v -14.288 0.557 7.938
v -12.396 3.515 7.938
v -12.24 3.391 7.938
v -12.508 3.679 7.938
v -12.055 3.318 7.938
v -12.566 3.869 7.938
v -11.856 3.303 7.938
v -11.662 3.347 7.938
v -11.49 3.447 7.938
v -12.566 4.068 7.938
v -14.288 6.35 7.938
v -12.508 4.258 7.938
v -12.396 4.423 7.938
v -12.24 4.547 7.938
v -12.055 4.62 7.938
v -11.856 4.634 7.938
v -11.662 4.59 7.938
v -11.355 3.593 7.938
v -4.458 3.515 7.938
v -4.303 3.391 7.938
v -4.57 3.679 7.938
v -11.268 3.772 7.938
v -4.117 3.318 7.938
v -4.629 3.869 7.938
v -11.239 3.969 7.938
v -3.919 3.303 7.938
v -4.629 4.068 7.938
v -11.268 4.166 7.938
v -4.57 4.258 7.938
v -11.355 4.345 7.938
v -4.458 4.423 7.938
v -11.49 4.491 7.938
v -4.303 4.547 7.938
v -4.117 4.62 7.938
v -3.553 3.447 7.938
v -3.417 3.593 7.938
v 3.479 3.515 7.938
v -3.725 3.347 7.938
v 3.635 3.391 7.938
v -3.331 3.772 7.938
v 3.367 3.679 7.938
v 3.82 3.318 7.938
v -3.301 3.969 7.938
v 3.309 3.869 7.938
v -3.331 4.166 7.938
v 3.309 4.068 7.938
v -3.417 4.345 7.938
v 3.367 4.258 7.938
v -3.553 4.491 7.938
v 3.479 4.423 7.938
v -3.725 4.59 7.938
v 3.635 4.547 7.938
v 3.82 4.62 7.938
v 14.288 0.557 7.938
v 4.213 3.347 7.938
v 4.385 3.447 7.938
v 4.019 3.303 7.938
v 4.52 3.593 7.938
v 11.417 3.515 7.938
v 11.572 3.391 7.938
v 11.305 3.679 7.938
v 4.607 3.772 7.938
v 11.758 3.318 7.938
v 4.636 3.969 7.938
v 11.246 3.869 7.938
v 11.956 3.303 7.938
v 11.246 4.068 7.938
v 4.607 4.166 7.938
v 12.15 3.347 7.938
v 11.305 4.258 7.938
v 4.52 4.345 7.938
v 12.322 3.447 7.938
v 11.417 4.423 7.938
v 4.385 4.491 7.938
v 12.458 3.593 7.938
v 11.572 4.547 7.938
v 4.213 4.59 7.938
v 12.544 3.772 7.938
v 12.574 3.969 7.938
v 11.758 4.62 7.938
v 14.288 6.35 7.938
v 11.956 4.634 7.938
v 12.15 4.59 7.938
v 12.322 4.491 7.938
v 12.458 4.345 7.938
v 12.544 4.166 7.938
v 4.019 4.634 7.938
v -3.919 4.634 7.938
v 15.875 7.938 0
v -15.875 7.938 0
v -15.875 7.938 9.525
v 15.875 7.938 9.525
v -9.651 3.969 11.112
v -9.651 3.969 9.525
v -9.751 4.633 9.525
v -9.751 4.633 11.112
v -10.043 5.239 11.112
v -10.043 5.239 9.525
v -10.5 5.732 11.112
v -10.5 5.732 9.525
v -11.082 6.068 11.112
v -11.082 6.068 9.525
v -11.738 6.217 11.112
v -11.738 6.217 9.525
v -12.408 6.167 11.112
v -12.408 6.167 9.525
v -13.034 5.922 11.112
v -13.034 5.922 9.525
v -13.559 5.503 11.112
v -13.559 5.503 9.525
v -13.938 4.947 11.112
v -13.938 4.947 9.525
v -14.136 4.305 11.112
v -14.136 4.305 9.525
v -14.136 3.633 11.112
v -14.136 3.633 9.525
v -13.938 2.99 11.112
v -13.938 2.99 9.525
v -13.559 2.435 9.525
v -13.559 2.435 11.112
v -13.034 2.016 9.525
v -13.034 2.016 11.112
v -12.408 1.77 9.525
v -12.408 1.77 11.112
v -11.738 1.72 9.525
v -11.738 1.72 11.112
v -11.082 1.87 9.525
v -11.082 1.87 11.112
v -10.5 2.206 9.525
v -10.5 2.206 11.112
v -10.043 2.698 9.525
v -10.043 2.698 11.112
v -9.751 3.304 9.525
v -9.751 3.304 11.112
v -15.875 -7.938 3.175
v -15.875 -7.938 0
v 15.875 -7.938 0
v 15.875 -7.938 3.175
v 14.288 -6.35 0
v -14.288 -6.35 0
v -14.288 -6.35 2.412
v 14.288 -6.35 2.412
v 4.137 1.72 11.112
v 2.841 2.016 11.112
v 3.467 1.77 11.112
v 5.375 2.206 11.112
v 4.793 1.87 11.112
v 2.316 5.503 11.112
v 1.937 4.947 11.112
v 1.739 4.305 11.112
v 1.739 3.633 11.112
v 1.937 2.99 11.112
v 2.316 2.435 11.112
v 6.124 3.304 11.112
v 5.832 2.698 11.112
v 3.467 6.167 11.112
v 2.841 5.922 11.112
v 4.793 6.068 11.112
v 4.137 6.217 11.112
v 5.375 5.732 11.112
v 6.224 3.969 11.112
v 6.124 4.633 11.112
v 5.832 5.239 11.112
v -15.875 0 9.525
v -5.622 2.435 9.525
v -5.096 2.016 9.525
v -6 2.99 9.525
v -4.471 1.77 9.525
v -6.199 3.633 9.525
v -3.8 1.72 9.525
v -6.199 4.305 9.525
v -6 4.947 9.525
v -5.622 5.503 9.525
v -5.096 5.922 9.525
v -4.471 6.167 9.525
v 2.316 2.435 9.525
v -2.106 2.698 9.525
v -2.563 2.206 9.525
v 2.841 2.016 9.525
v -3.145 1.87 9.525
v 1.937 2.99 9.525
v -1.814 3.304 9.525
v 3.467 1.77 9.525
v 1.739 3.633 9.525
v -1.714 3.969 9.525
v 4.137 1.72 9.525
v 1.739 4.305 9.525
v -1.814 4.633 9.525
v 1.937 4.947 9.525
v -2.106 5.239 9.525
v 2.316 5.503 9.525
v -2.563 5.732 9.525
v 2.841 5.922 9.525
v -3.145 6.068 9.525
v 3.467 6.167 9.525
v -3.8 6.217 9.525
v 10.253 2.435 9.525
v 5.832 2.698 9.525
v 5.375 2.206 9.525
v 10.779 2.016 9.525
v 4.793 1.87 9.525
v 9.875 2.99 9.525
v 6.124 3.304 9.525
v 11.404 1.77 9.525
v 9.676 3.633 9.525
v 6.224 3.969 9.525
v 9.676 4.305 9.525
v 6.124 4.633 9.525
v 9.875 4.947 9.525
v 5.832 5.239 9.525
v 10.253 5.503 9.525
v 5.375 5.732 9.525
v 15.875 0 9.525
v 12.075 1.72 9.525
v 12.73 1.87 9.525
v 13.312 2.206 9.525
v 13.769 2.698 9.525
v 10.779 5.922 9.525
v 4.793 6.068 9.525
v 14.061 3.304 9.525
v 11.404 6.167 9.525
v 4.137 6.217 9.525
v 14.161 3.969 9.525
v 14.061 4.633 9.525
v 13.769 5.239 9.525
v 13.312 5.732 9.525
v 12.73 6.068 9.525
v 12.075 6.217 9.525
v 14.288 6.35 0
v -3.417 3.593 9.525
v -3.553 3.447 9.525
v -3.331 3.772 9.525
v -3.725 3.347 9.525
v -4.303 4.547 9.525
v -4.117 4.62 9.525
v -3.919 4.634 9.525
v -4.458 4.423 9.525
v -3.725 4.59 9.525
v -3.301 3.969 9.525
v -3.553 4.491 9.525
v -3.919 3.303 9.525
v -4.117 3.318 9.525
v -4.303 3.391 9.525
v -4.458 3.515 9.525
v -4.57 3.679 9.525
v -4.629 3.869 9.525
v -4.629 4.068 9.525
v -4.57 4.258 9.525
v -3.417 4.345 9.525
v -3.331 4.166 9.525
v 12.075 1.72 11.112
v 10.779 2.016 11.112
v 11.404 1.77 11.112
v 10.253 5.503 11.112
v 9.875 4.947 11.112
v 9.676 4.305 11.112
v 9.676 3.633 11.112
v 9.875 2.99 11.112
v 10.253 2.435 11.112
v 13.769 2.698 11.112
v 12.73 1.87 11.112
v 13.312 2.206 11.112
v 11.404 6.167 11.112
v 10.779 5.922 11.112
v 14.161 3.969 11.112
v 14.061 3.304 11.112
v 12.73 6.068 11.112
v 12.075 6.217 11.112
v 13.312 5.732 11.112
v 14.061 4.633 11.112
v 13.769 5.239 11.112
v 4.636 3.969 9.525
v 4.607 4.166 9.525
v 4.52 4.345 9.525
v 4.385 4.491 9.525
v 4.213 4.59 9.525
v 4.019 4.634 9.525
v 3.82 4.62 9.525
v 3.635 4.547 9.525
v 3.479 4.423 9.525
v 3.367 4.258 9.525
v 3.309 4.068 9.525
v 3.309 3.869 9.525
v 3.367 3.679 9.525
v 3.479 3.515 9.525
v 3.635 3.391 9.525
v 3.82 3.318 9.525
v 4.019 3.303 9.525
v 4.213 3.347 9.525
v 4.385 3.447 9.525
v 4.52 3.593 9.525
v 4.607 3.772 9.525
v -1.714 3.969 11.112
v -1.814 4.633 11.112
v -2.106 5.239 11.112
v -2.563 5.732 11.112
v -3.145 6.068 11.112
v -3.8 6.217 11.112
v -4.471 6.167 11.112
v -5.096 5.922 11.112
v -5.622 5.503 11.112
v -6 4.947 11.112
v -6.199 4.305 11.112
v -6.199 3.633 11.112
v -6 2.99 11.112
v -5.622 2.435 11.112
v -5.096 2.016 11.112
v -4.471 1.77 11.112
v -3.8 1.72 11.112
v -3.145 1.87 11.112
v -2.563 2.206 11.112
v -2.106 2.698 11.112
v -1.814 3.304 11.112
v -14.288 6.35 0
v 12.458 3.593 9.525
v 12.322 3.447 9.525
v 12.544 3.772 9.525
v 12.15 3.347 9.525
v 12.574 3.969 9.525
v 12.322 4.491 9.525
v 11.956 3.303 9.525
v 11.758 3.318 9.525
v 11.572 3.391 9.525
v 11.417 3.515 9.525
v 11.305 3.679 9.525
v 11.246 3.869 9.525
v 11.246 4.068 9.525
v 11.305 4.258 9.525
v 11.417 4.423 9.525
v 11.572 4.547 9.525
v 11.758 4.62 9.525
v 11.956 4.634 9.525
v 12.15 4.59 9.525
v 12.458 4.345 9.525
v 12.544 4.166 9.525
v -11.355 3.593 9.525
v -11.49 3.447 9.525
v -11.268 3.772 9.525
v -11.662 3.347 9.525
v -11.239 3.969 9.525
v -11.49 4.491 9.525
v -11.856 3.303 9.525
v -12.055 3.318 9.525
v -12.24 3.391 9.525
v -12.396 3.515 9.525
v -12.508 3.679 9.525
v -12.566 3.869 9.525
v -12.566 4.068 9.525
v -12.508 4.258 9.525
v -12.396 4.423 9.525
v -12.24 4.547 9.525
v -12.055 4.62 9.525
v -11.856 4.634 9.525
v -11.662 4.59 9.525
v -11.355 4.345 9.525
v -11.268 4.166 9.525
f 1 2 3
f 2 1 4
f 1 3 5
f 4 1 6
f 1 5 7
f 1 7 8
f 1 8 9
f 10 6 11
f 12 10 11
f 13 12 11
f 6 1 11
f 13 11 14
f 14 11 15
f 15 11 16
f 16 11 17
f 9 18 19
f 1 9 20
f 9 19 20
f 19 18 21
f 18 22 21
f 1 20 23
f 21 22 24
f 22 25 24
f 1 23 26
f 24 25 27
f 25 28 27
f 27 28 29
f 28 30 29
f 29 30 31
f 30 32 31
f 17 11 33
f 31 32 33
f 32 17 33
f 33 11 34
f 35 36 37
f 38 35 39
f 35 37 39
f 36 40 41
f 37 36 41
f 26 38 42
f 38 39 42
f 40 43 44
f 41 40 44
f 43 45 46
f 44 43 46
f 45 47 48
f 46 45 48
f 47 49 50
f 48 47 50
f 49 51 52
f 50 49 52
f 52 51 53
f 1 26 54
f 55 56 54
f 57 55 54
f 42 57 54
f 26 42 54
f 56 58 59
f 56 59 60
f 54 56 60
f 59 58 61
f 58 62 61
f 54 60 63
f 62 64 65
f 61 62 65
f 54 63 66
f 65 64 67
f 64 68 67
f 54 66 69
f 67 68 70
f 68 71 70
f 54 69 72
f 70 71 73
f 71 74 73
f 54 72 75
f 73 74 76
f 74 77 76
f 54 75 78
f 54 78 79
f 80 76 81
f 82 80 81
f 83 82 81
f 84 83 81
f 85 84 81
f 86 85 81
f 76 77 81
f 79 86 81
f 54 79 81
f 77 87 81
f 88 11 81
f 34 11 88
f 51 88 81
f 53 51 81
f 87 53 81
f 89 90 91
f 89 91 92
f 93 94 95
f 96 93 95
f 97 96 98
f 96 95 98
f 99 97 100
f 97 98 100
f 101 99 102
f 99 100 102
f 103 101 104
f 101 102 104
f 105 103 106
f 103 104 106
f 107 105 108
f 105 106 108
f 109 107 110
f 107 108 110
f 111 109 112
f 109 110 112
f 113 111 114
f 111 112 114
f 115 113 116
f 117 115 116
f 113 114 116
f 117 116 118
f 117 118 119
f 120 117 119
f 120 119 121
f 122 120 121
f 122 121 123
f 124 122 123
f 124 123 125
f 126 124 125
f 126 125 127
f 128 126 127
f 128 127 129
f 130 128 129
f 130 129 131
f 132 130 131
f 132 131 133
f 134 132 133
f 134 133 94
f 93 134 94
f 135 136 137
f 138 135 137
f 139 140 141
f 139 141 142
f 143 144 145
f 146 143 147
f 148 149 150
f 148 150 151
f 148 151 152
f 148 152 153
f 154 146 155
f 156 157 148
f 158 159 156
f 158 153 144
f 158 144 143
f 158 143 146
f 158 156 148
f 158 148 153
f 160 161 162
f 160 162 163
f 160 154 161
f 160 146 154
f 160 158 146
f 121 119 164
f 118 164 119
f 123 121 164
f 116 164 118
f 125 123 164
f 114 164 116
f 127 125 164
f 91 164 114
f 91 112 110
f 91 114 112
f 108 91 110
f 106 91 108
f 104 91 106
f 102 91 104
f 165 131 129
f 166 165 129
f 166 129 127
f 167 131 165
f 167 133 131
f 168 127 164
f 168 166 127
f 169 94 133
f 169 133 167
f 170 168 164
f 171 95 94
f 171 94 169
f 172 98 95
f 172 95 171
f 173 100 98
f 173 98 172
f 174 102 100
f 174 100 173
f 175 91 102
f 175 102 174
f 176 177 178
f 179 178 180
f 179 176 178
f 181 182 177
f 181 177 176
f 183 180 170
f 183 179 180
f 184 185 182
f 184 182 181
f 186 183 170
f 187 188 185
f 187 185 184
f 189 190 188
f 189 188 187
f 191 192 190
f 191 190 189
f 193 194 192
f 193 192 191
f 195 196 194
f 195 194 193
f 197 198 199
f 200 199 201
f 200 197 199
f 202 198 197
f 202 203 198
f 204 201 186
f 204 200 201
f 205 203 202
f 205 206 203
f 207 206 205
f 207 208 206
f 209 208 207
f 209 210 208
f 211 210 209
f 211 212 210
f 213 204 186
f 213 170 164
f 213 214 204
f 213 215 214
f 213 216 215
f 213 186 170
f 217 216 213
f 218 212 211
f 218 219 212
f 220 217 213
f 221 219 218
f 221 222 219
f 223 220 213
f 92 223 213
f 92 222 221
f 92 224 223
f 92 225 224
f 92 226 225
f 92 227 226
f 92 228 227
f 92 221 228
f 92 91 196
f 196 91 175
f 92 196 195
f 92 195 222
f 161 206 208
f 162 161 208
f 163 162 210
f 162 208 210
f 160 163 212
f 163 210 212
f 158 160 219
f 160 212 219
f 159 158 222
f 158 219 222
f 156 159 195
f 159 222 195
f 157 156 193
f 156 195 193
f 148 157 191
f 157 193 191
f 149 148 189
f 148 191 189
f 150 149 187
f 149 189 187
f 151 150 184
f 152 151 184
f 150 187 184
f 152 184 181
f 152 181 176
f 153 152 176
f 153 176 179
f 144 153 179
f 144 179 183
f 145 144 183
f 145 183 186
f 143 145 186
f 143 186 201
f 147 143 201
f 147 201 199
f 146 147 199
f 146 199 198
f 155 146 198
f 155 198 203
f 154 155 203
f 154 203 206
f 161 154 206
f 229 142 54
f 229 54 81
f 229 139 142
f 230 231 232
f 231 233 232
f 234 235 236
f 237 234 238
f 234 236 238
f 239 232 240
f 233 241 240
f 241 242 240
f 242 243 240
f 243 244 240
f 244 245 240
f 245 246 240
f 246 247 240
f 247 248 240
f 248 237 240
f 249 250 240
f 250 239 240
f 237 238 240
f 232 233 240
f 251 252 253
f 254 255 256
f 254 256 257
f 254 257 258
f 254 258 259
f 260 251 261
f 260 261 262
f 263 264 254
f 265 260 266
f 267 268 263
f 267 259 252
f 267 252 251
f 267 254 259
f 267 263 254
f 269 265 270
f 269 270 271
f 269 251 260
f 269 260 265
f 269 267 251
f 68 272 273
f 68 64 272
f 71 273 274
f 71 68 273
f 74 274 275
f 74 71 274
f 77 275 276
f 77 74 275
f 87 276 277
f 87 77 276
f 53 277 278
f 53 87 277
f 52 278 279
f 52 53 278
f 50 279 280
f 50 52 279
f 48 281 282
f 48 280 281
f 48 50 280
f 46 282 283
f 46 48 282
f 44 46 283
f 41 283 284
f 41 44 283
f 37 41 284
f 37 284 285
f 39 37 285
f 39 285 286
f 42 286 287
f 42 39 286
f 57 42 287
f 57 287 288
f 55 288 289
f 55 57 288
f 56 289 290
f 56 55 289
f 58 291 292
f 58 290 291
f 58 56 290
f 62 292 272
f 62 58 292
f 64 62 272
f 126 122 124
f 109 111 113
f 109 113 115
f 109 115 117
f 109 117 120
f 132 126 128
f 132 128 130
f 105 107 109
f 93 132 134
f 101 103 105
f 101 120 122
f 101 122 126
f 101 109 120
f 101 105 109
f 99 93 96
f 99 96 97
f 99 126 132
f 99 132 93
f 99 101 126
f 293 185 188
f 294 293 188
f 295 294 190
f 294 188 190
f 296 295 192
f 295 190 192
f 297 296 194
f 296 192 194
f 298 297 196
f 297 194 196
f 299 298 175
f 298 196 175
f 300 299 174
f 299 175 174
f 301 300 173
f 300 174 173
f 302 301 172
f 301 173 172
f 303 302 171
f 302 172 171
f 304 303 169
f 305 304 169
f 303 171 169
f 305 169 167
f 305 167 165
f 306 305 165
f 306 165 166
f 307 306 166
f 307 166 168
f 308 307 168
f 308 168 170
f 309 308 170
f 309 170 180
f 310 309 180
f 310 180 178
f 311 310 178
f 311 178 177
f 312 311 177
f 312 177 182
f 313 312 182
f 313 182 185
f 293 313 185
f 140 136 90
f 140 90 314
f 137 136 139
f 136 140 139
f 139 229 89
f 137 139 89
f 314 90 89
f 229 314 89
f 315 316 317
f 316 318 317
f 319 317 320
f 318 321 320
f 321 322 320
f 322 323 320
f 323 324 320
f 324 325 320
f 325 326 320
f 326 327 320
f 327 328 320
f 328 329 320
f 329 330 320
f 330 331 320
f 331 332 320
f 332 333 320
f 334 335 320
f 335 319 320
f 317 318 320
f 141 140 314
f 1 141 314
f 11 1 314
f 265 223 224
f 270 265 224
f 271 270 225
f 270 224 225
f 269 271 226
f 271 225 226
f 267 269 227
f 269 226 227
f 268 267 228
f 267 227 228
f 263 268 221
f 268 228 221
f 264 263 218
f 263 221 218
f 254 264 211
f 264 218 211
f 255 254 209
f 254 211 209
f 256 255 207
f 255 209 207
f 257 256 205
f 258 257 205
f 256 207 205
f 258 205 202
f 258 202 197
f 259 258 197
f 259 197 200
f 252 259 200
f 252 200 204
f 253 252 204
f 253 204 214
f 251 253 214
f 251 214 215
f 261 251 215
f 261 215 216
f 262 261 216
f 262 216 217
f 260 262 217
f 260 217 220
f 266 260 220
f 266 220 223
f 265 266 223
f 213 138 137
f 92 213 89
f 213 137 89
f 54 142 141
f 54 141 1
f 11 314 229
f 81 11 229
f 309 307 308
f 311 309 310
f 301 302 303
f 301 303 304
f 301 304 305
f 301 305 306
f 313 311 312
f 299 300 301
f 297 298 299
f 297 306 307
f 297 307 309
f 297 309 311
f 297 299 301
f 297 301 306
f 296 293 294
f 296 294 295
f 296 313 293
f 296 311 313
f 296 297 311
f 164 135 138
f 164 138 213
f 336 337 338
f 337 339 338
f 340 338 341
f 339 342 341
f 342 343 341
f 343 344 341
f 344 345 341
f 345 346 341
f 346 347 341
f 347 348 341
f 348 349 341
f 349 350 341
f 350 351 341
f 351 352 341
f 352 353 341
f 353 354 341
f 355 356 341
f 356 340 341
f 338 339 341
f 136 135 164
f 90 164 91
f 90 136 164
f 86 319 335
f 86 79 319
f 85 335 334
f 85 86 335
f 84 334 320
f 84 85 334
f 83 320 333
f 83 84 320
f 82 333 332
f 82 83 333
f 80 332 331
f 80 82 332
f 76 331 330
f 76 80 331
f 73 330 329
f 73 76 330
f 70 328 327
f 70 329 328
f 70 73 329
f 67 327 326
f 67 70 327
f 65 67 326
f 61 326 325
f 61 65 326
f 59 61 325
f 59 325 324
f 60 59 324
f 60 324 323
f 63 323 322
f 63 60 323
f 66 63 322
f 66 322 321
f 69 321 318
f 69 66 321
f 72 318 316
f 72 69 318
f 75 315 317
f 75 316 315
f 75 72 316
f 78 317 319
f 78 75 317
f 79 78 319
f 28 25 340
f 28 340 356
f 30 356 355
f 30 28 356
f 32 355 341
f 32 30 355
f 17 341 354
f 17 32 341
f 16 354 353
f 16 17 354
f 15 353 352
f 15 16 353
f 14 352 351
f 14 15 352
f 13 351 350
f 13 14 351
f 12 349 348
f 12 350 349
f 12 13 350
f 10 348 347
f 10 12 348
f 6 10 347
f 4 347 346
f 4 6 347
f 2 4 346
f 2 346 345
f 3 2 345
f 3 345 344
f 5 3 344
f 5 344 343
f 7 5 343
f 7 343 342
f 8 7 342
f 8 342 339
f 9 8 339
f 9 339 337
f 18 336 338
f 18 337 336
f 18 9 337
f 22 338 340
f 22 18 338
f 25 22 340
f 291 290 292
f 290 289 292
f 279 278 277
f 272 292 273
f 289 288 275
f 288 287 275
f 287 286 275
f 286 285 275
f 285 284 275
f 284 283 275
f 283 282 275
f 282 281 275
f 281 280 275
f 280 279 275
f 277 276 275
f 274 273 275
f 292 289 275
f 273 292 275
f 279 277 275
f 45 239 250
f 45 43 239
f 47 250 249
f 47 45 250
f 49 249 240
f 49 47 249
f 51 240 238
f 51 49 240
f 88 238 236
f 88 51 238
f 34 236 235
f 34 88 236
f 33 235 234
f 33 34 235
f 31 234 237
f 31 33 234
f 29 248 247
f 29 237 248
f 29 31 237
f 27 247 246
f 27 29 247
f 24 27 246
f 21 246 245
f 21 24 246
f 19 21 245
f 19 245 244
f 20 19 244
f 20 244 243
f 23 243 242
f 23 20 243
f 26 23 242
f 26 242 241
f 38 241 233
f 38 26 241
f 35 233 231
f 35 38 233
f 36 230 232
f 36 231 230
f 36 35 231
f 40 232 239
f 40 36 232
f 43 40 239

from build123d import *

# Parameters (mm, degrees)
F0_W     = 31.75
F0_H     = 15.875
F0_R     = 2.2550277878
F1_DEPTH = 9.525
F2_DEPTH = 11.1125
F4_DEPTH = 31.751
F5_T     = -1.5875


# Not quite as in the source:
# - a feature names something its author has since deleted; it is built from what else it names


with BuildPart() as f1:
    # F0 (on Top) → F1 (new body)
    with BuildSketch(Plane.XY):
        Rectangle(F0_W, F0_H)
        with Locations((-11.90625, 3.96875)):
            Circle(F0_R, mode=Mode.SUBTRACT)
        with Locations((-3.96875, 3.96875)):
            Circle(F0_R, mode=Mode.SUBTRACT)
        with Locations((3.96875, 3.96875)):
            Circle(F0_R, mode=Mode.SUBTRACT)
        with Locations((11.90625, 3.96875)):
            Circle(F0_R, mode=Mode.SUBTRACT)
    extrude(amount=F1_DEPTH)

    # F0 (on Top) → F2 (join)
    with BuildSketch(Plane.XY):
        with Locations((-11.90625, 3.96875)):
            Circle(F0_R)
        with Locations((-3.96875, 3.96875)):
            Circle(F0_R)
        with Locations((3.96875, 3.96875)):
            Circle(F0_R)
        with Locations((11.90625, 3.96875)):
            Circle(F0_R)
    extrude(amount=F2_DEPTH)

    # F3 (on face) → F4 (cut, through all)
    with BuildSketch(Plane.YZ.offset(15.875)):
        Polygon((-7.9375, 9.525), (-7.9375, 3.175), (0, 9.525), align=None)
    extrude(amount=-F4_DEPTH, mode=Mode.SUBTRACT)

    # F5
    f5_openings = [f1.faces().sort_by_distance(p)[0] for p in [
        (0, 0, 0),
    ]]
    offset(amount=F5_T, openings=f5_openings, kind=Kind.INTERSECTION)


solid = f1.part
